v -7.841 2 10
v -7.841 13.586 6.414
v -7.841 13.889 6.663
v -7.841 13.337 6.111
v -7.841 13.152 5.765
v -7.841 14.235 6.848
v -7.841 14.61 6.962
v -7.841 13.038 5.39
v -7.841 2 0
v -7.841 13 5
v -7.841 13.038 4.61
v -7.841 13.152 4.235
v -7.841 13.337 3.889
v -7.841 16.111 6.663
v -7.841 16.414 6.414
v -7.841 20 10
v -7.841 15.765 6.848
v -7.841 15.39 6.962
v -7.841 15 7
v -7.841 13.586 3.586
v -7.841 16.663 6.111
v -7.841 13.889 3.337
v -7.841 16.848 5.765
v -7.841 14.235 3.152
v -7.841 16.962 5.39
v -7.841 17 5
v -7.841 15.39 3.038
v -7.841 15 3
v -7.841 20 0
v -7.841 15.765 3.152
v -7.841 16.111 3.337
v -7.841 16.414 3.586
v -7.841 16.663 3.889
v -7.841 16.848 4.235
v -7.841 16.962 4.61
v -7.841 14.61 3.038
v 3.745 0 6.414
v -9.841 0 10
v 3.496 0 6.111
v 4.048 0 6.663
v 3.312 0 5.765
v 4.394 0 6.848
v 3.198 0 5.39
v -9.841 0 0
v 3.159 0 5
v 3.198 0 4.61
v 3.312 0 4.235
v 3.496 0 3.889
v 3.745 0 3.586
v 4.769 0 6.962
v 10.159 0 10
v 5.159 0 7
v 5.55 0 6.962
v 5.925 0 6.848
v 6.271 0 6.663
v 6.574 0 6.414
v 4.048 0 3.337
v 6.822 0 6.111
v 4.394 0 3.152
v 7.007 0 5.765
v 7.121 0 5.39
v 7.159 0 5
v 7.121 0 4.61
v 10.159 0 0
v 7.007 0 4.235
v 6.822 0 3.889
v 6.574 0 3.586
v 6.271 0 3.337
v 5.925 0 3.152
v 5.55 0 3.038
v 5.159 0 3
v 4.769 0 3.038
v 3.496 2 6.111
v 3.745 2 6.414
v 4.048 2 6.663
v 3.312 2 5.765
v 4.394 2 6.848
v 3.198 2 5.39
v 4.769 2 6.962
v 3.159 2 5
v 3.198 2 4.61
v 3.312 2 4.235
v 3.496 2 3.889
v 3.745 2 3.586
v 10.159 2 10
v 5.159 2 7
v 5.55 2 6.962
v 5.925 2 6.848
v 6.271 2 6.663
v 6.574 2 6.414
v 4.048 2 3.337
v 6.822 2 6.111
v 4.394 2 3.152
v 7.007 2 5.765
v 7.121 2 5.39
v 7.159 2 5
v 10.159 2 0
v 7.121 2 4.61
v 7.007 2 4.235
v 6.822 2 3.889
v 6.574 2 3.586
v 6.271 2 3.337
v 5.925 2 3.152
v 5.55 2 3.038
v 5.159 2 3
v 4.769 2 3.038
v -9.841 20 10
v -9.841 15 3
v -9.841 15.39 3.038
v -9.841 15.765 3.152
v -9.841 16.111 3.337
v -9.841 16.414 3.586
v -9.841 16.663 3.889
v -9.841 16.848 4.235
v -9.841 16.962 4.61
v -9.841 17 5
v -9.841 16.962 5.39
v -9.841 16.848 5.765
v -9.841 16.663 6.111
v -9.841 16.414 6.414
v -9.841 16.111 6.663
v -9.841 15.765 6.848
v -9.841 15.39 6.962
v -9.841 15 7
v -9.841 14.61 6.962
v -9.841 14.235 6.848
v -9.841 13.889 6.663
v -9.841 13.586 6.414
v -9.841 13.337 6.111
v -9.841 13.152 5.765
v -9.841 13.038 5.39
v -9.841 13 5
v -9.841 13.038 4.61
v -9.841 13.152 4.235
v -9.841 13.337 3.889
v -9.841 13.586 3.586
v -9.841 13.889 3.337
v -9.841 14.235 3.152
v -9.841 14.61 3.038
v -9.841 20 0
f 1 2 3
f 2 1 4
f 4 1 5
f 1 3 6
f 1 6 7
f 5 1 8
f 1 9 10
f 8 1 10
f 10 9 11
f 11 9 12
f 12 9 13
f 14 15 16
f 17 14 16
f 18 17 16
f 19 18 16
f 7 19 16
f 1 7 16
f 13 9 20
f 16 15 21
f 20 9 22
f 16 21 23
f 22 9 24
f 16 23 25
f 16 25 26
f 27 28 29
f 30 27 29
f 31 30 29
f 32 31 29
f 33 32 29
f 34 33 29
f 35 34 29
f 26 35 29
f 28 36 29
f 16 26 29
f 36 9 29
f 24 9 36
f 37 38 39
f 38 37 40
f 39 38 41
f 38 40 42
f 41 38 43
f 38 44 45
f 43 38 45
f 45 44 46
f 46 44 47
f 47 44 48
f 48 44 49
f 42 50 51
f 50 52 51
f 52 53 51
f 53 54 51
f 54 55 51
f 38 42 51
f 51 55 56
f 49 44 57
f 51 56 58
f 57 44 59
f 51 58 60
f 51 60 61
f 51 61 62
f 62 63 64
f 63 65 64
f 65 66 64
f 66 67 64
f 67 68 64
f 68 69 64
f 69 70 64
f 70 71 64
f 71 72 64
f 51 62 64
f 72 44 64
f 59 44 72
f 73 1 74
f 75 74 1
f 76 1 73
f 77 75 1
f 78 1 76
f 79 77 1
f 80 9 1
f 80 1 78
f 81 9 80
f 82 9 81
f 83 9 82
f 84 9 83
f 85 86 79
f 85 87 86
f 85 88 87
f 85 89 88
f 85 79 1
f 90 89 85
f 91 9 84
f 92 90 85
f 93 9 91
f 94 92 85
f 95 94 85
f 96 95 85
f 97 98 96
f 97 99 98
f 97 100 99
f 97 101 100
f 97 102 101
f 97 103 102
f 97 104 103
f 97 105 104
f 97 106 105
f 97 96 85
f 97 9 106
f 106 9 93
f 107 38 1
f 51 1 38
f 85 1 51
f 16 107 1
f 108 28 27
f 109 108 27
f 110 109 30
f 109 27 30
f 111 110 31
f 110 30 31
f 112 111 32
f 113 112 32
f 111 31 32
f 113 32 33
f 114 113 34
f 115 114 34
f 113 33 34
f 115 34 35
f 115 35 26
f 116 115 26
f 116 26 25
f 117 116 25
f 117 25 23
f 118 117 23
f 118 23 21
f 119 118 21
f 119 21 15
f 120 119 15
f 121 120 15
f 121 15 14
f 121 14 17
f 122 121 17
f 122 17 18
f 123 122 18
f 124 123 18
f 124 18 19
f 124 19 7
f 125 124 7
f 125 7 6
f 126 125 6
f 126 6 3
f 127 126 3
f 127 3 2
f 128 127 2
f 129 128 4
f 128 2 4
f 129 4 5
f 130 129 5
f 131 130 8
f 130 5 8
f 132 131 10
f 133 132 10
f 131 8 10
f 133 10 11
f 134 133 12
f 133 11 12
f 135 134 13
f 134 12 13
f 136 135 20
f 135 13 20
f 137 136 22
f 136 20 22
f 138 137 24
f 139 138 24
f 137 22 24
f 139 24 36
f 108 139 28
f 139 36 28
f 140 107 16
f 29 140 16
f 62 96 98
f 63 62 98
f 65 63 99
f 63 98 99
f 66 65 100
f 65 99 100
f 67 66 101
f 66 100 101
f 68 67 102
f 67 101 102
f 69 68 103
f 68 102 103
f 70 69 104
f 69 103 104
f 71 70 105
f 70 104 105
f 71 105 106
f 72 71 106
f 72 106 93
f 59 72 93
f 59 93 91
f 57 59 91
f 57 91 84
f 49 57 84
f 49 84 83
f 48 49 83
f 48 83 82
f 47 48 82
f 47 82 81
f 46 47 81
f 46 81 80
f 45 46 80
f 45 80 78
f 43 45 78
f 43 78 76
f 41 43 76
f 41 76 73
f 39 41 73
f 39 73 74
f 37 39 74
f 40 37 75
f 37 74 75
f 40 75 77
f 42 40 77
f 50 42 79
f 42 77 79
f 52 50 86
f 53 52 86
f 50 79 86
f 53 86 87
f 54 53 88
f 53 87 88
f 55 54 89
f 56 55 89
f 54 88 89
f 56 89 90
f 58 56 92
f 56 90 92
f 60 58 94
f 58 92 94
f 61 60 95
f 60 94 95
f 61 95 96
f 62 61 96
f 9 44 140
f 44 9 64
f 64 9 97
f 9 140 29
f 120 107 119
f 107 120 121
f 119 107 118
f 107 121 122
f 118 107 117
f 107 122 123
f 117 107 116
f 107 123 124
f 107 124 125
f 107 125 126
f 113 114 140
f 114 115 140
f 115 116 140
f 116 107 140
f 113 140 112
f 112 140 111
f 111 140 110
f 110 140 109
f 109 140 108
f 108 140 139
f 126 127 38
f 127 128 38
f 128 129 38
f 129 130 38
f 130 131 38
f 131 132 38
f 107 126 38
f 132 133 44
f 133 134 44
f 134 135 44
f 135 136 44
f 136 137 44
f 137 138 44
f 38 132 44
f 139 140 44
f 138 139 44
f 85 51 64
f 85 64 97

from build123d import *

# Parameters (mm, degrees)
SKETCH1_W           = 2
SKETCH1_H           = 18
SKETCH1_H_2         = 2
SKETCH1_W_2         = 18
BOSS_EXTRUDE2_DEPTH = 10
SKETCH3_R           = 2
CUT_EXTRUDE1_DEPTH  = 3
SKETCH4_R           = 2
CUT_EXTRUDE2_DEPTH  = 3


with BuildPart() as part:
    # Sketch1 → Boss-Extrude2 (new body)
    with BuildSketch(Plane.XY):
        with Locations((-8.840572317, 11)):
            Rectangle(SKETCH1_W, SKETCH1_H)
        with Locations((-8.840572317, 1)):
            Rectangle(SKETCH1_W, SKETCH1_H_2)
        with Locations((1.159427683, 1)):
            Rectangle(SKETCH1_W_2, SKETCH1_H_2)
    extrude(amount=BOSS_EXTRUDE2_DEPTH)

    # Sketch3 → Cut-Extrude1 (cut, through all)
    with BuildSketch(Plane(origin=(0, 2, 0), x_dir=(1, 0, 0), z_dir=(0, 1, 0))):
        with Locations((5.159427683, -5)):
            Circle(SKETCH3_R)
    extrude(amount=-CUT_EXTRUDE1_DEPTH, mode=Mode.SUBTRACT)

    # Sketch4 → Cut-Extrude2 (cut, through all)
    with BuildSketch(Plane(origin=(-7.840572317, 0, 0), x_dir=(0, 0, -1), z_dir=(1, 0, 0))):
        with Locations((-5, 15)):
            Circle(SKETCH4_R)
    extrude(amount=-CUT_EXTRUDE2_DEPTH, mode=Mode.SUBTRACT)


solid = part.part
